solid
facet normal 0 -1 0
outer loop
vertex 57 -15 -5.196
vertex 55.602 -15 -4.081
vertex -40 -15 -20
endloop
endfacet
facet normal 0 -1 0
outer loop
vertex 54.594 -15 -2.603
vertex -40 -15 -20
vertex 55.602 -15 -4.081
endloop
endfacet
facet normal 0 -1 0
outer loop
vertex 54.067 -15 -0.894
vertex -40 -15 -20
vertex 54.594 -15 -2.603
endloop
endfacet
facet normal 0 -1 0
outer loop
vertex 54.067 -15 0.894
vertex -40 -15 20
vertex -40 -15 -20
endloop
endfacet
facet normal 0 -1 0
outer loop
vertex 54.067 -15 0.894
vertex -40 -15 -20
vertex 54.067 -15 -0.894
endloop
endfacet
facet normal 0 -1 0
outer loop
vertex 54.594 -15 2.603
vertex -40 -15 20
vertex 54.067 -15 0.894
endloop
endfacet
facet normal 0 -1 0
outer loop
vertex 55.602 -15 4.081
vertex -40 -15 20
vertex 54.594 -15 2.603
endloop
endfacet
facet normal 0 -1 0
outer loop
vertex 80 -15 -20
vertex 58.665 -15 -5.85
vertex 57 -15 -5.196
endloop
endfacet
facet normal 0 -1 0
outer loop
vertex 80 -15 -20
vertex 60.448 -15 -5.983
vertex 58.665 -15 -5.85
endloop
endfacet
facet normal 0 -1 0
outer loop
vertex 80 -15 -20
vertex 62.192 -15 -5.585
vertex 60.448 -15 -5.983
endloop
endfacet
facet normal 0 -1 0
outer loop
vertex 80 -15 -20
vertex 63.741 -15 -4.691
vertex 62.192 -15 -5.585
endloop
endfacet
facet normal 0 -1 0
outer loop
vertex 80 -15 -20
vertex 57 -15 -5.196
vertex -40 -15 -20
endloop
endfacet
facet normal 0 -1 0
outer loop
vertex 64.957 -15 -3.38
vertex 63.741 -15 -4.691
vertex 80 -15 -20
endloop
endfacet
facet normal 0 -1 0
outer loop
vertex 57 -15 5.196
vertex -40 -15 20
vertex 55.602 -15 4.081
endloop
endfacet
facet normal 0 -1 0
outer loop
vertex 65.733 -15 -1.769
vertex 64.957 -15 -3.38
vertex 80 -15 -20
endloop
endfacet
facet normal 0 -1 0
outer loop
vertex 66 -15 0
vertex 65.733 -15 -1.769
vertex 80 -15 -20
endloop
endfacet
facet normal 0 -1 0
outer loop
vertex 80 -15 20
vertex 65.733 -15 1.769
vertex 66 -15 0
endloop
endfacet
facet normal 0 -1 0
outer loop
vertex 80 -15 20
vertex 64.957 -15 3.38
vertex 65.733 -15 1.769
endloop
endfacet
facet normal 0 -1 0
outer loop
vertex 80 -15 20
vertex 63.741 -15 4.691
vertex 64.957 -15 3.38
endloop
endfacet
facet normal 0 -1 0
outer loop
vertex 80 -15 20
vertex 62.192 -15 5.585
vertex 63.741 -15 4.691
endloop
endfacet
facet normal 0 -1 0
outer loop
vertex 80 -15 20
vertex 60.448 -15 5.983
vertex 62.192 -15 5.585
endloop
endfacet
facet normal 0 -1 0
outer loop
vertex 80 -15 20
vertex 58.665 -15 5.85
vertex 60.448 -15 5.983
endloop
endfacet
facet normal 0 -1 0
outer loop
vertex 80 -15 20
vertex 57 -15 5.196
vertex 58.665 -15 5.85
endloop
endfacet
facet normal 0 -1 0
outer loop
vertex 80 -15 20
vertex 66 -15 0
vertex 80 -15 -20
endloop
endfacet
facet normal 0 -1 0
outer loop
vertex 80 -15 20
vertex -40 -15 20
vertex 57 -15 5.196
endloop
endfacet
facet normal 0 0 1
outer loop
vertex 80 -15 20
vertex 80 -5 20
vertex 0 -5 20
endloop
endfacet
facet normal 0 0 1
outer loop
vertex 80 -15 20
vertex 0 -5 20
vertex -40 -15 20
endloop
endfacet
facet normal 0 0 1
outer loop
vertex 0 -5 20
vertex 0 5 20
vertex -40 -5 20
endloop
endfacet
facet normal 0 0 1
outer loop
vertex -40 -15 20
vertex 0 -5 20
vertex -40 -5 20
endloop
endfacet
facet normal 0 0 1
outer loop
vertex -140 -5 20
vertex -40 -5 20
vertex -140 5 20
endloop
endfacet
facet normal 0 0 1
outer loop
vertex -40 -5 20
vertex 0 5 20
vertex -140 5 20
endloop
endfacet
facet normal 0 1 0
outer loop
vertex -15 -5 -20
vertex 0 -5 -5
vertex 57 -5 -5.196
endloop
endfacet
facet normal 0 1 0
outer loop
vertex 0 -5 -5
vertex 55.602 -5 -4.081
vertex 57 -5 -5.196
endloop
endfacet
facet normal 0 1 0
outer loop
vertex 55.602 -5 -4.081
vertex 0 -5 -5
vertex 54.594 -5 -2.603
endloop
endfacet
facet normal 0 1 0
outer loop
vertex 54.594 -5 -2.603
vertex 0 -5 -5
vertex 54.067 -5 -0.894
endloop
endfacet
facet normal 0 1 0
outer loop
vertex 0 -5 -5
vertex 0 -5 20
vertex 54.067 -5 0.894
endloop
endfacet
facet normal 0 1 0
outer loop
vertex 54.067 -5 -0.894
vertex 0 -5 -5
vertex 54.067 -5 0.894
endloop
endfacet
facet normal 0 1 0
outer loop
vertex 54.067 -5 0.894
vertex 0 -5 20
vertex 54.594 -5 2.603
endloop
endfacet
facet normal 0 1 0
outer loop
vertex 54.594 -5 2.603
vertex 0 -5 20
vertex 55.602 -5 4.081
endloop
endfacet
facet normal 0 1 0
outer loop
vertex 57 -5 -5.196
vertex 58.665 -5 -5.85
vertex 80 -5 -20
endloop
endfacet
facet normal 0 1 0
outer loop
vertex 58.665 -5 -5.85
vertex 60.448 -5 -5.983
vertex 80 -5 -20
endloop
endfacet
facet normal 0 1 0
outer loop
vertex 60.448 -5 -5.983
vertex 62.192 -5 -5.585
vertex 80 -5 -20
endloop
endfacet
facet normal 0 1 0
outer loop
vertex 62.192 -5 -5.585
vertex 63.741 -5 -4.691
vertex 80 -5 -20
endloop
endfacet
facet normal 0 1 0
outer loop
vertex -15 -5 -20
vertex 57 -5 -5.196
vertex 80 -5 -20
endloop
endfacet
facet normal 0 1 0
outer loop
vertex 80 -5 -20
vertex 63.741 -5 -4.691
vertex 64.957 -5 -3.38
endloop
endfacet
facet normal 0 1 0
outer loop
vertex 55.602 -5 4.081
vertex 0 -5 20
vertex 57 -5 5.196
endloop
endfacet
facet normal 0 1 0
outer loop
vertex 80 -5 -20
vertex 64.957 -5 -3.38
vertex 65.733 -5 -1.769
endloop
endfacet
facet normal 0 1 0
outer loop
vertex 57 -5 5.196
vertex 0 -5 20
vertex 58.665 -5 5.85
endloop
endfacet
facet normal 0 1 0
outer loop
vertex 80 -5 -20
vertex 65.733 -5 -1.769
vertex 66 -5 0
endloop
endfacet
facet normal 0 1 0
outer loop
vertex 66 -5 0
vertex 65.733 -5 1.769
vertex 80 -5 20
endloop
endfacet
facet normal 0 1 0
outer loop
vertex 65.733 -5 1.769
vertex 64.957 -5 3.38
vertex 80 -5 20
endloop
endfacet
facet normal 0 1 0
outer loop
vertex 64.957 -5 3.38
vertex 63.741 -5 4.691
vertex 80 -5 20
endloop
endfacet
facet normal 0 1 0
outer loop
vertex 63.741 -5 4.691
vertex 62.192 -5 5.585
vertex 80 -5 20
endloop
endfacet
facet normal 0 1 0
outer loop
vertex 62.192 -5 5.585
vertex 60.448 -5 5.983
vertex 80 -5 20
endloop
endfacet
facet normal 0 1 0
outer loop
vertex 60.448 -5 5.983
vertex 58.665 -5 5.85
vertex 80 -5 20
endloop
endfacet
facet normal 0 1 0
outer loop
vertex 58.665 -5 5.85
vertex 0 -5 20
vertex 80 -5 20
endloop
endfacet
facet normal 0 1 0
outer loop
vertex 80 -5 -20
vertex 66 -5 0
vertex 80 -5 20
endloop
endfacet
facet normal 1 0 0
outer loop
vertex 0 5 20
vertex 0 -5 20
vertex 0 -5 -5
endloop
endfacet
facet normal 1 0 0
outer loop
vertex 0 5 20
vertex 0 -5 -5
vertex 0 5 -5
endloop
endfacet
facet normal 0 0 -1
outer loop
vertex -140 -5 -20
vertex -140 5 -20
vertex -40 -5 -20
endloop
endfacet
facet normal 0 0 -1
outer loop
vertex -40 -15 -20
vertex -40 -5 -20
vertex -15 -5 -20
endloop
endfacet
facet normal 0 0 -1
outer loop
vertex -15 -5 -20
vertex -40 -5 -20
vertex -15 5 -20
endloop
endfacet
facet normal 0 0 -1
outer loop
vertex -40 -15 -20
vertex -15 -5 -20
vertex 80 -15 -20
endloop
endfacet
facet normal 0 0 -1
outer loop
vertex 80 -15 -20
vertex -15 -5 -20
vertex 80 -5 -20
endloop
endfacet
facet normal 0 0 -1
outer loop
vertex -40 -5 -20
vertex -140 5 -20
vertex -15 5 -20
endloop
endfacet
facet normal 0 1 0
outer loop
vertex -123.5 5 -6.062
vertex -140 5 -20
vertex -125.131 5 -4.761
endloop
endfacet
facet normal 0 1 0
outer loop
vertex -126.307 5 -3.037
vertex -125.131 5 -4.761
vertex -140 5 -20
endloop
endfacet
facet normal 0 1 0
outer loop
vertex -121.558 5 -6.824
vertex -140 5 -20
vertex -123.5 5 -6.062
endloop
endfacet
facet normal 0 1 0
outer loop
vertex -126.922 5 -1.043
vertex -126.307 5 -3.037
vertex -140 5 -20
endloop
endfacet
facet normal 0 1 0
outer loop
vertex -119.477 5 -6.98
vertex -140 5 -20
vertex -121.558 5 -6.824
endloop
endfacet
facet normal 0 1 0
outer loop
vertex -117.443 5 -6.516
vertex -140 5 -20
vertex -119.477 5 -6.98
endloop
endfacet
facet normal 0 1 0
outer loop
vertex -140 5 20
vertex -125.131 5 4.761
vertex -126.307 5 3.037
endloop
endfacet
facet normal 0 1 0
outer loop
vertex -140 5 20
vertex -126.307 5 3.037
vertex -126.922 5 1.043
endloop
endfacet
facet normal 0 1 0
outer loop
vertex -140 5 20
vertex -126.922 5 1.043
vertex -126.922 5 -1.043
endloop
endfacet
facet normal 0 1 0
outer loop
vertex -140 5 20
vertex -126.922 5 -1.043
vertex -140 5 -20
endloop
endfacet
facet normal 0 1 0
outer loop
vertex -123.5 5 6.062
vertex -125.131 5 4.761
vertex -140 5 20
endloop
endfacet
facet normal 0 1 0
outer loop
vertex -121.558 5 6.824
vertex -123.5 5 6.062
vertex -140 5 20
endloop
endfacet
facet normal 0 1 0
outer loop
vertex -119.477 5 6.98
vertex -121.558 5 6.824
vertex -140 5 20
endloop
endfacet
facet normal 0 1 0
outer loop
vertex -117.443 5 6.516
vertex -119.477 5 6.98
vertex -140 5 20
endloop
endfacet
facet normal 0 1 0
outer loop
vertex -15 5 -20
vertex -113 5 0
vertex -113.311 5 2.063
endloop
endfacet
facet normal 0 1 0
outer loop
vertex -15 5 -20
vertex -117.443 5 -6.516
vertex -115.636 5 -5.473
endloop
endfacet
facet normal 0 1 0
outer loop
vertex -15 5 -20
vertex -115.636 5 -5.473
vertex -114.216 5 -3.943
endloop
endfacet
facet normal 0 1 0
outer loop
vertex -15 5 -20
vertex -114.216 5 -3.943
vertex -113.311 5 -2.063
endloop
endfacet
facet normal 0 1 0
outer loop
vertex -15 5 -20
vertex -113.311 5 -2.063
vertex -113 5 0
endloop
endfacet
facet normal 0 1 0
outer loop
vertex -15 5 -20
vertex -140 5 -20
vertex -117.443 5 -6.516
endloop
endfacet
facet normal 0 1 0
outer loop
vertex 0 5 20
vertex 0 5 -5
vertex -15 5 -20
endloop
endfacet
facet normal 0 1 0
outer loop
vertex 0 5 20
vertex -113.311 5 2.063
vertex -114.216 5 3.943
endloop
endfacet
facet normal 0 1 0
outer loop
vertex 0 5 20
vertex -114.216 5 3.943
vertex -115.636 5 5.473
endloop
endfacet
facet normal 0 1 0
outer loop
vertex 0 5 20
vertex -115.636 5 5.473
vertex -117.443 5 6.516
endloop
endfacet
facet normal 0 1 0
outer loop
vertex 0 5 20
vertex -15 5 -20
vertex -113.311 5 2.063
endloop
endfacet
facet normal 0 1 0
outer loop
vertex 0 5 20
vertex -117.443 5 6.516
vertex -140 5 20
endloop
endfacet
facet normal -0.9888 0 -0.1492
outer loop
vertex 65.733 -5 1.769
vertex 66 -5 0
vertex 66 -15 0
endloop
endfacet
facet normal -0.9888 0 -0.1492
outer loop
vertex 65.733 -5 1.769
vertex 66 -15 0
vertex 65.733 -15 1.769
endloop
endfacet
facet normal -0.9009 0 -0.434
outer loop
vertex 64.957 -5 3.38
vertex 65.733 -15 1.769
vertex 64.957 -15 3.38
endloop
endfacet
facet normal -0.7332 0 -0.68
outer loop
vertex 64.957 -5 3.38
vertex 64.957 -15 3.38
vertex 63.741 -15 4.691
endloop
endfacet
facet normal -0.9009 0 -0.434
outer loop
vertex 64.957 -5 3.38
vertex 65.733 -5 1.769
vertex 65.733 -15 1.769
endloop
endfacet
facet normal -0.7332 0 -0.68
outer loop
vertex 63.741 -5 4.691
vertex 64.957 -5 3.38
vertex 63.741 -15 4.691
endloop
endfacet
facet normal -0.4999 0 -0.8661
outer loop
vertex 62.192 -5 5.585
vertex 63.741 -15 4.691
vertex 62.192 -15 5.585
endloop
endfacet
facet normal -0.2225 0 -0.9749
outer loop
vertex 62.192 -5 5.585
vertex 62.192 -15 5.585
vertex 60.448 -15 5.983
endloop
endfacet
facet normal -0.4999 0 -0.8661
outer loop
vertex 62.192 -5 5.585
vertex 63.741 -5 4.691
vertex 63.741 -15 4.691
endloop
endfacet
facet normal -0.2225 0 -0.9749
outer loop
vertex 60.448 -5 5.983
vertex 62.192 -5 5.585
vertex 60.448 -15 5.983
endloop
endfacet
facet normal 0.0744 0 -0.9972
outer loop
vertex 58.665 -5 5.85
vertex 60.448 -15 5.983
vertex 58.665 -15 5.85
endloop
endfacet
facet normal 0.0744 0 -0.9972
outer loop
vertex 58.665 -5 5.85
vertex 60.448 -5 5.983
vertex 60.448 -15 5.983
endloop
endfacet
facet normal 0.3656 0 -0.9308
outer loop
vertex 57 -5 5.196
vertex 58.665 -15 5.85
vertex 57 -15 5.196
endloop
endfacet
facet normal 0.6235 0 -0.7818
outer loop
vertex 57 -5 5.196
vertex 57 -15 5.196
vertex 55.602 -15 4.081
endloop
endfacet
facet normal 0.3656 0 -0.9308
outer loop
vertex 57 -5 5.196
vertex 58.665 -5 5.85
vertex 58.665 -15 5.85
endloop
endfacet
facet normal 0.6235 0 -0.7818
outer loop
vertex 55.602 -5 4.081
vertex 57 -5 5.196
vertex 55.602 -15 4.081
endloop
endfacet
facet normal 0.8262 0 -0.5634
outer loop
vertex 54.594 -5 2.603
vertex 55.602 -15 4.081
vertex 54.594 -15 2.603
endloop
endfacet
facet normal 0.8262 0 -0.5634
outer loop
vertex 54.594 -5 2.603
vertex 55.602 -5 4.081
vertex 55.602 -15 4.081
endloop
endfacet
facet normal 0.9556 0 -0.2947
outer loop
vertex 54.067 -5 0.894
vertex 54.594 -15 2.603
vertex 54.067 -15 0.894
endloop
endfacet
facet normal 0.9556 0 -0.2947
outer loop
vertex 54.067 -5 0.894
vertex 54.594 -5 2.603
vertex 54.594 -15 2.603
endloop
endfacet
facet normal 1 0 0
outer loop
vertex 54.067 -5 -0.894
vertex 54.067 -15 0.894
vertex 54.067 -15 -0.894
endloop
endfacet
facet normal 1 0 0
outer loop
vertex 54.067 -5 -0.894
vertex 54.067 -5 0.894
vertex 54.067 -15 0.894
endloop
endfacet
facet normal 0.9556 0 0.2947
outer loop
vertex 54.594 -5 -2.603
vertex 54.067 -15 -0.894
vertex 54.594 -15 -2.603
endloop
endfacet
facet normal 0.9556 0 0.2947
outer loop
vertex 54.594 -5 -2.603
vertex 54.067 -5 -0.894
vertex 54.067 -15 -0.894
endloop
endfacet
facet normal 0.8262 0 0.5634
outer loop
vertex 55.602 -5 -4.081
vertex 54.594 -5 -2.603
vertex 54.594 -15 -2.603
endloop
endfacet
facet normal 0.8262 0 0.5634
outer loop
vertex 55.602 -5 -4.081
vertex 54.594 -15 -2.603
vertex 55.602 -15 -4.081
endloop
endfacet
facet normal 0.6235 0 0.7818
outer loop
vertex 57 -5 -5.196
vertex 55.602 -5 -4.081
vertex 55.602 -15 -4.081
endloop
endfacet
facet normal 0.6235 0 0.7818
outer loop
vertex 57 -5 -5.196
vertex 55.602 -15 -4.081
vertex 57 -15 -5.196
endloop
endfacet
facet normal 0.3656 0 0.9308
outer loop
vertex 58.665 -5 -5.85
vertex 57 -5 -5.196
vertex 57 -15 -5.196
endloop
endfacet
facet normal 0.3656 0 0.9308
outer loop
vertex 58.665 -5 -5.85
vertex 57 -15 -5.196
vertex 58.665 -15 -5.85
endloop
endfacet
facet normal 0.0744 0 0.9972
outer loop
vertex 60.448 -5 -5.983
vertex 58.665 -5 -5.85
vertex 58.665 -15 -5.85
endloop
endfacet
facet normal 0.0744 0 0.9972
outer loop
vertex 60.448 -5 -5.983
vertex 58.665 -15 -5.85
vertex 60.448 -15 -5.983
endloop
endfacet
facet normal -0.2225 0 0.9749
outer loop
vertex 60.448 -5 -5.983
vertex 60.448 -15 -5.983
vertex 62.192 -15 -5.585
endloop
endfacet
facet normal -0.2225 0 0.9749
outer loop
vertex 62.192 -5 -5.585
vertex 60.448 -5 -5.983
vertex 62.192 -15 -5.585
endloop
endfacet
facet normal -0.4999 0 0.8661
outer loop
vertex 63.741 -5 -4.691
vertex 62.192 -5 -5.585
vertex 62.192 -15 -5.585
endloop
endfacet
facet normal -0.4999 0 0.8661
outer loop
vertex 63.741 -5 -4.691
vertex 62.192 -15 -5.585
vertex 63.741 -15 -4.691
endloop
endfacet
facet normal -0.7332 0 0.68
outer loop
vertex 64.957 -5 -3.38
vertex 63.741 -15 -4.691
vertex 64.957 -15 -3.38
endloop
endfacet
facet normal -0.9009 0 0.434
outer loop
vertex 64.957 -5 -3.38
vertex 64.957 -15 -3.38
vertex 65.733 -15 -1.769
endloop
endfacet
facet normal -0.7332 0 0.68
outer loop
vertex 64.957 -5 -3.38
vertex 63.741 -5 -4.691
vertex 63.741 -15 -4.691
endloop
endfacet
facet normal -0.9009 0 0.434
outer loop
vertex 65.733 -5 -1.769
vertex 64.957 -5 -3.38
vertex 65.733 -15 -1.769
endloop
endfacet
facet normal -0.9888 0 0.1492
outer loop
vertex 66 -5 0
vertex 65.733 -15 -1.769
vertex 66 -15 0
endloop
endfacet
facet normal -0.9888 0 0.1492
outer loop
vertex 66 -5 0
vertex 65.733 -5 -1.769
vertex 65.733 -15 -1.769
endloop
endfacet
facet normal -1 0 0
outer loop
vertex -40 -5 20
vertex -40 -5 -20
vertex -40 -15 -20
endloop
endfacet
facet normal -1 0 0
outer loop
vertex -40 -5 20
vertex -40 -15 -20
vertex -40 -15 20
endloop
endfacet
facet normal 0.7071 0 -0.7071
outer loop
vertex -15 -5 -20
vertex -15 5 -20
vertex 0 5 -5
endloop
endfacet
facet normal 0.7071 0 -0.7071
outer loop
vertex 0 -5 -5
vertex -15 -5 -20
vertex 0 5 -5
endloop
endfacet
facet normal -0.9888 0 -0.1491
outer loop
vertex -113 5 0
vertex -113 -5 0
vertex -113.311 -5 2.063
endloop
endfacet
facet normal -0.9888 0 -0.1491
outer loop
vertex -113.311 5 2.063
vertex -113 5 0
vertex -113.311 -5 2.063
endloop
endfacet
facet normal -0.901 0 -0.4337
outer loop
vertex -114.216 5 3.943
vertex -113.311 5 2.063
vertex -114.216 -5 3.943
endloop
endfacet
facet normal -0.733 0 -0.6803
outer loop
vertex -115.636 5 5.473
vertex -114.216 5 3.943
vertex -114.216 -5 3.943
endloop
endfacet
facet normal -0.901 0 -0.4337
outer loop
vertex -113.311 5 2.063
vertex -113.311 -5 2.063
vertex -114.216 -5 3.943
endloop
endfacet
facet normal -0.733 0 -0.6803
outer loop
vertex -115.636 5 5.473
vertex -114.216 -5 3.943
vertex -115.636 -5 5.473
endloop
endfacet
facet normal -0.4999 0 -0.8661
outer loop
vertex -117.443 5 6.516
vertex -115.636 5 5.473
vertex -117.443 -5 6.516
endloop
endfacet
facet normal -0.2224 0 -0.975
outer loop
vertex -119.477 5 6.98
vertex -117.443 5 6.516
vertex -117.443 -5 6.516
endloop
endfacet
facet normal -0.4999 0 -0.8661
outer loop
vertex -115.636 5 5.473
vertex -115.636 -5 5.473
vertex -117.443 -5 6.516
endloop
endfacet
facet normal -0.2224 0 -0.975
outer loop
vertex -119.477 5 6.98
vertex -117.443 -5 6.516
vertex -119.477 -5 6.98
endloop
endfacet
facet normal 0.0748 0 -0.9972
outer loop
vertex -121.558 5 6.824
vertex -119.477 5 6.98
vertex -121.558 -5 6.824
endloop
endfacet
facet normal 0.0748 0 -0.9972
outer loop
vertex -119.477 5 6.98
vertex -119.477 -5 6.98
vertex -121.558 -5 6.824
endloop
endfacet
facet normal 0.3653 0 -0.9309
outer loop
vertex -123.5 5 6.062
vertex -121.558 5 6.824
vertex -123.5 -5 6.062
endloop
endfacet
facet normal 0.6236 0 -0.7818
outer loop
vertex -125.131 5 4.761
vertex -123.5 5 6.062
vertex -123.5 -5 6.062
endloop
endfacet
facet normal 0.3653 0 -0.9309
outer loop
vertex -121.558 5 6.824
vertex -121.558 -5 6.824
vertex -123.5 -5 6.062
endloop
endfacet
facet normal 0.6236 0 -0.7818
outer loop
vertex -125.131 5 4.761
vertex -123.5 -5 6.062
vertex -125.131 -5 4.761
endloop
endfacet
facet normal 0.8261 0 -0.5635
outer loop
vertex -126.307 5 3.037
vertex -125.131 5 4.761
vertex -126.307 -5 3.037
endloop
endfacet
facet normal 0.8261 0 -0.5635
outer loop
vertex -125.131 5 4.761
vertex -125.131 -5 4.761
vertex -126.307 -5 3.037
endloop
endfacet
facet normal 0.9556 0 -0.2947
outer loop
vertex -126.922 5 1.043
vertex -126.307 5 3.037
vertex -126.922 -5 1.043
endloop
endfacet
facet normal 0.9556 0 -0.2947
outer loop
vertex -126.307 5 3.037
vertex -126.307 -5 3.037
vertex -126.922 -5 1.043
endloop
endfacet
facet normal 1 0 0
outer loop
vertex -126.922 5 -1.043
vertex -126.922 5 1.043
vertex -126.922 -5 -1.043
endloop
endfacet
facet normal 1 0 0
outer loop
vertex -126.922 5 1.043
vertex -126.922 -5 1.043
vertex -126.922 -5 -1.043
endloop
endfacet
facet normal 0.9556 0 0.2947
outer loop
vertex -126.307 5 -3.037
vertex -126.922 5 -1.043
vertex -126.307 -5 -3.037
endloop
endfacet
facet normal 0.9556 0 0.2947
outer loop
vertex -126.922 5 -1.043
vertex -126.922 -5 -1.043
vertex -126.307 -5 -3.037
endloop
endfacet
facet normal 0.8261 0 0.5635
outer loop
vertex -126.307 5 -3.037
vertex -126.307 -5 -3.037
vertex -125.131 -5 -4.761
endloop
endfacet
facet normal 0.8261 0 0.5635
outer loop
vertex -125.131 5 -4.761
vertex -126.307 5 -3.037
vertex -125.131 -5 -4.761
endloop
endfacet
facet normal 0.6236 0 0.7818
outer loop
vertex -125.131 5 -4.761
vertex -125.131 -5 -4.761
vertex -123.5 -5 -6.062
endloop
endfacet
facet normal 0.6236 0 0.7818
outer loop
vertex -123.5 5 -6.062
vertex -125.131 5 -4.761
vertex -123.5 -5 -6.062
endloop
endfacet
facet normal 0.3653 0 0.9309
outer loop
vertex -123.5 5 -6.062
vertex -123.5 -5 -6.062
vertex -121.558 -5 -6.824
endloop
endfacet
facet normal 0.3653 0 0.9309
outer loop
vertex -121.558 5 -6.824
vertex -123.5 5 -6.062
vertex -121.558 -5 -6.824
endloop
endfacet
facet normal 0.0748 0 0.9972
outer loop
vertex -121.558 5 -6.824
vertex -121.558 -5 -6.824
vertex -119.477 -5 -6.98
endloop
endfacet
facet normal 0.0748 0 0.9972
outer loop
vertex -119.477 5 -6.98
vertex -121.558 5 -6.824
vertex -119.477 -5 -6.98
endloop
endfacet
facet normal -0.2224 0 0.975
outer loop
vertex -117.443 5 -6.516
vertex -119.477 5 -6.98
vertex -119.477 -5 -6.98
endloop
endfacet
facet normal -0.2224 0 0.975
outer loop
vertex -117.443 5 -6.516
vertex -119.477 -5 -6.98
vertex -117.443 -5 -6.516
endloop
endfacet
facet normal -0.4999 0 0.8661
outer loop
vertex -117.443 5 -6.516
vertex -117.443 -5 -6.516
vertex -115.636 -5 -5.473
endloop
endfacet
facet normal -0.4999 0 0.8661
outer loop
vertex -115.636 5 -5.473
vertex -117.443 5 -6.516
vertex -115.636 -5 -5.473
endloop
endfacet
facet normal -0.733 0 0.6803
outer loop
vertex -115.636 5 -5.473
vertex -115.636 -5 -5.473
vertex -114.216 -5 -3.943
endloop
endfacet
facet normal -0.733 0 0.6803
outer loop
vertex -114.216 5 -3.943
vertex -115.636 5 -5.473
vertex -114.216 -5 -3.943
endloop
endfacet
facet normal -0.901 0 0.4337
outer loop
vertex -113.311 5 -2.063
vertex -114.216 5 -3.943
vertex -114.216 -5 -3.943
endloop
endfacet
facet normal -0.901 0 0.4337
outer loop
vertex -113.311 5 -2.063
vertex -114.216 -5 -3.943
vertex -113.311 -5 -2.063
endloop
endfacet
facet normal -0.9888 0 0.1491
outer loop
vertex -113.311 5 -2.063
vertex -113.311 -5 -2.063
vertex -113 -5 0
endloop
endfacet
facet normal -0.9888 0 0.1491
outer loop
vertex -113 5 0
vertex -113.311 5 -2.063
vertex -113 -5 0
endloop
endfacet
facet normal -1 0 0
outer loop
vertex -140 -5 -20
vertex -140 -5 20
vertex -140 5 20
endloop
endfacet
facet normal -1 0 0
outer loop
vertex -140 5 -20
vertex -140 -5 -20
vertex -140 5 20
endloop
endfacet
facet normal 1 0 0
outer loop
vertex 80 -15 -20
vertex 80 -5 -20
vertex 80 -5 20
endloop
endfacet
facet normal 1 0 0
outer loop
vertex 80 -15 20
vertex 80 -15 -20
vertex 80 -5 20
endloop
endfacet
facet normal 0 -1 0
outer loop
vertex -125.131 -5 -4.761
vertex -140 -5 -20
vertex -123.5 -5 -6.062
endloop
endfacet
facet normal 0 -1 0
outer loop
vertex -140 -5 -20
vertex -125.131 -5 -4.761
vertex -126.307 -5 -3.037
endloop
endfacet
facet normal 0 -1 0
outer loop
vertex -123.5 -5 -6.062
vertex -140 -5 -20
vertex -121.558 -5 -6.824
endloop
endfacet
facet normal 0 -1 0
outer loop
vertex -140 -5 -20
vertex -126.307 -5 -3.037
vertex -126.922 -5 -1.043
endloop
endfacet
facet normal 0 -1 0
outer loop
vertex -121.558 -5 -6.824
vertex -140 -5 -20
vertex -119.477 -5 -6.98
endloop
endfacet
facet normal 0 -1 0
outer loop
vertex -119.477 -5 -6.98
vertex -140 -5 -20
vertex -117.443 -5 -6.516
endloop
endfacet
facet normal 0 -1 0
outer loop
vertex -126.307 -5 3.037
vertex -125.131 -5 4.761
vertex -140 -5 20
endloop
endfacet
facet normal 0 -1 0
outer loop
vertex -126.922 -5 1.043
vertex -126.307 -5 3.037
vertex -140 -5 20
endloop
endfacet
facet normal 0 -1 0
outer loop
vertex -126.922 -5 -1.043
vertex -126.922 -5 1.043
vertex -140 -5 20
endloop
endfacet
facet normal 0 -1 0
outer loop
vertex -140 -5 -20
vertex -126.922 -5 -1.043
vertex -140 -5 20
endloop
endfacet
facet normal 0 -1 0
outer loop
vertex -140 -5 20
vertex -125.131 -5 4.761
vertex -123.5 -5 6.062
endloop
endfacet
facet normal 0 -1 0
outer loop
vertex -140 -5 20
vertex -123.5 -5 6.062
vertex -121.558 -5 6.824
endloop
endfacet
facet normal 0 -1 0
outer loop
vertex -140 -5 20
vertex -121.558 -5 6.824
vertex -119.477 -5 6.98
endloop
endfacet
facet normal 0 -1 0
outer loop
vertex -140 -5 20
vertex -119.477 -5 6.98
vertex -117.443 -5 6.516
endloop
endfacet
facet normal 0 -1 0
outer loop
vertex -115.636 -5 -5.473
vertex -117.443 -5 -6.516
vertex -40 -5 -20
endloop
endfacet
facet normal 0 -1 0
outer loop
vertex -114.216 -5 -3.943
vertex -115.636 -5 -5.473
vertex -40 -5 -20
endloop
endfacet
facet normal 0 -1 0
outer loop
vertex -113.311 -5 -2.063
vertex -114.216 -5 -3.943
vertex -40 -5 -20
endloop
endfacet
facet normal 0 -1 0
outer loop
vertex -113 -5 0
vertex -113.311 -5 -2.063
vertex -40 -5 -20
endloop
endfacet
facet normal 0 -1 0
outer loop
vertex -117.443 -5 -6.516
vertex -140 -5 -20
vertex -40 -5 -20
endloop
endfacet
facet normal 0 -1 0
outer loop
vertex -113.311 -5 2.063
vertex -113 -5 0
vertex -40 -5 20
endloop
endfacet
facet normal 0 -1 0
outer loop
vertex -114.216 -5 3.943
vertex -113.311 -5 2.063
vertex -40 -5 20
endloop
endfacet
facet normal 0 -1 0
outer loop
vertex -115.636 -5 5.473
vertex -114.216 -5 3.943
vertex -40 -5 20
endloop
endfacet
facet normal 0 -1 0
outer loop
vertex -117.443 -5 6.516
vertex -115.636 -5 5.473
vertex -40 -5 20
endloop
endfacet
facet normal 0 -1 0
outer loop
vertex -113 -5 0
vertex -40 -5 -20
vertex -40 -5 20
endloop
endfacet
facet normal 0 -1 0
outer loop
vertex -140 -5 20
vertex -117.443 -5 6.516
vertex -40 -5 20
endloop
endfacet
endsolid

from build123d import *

# Parameters (mm, degrees)
F0_W     = 10
F0_H     = 40
F1_DEPTH = 140
F2_R     = 7
F3_DEPTH = 10.001
F4_W     = 80
F4_H     = 40
F4_R     = 6
F4_W_2   = 40
F5_DEPTH = 10
F7_DEPTH = 10


# Not quite as in the source:
# - a feature names something its author has since deleted; it is built from what else it names


with BuildPart() as f1:
    # F0 (on Right) → F1 (new body)
    with BuildSketch(Plane.YZ):
        Rectangle(F0_W, F0_H)
    extrude(amount=-F1_DEPTH)

    # F2 (on face) → F3 (cut, through all)
    with BuildSketch(Plane.XZ.offset(5)):
        with Locations((-120, 0)):
            Circle(F2_R)
    extrude(amount=-F3_DEPTH, mode=Mode.SUBTRACT)

    # F4 (on face) → F5 (join)
    with BuildSketch(Plane.XZ.offset(5)):
        with Locations((40, 0)):
            Rectangle(F4_W, F4_H)
        with Locations((60, 0)):
            Circle(F4_R, mode=Mode.SUBTRACT)
        with Locations((-20, 0)):
            Rectangle(F4_W_2, F4_H)
    extrude(amount=F5_DEPTH)

    # F6 (on face) → F7 (cut, through all)
    with BuildSketch(Plane(origin=(0, 5, 0), x_dir=(-1, 0, 0), z_dir=(0, 1, 0))):
        Polygon((15, -20), (0, -5), (0, -20), align=None)
    extrude(amount=-F7_DEPTH, mode=Mode.SUBTRACT)


solid = f1.part
